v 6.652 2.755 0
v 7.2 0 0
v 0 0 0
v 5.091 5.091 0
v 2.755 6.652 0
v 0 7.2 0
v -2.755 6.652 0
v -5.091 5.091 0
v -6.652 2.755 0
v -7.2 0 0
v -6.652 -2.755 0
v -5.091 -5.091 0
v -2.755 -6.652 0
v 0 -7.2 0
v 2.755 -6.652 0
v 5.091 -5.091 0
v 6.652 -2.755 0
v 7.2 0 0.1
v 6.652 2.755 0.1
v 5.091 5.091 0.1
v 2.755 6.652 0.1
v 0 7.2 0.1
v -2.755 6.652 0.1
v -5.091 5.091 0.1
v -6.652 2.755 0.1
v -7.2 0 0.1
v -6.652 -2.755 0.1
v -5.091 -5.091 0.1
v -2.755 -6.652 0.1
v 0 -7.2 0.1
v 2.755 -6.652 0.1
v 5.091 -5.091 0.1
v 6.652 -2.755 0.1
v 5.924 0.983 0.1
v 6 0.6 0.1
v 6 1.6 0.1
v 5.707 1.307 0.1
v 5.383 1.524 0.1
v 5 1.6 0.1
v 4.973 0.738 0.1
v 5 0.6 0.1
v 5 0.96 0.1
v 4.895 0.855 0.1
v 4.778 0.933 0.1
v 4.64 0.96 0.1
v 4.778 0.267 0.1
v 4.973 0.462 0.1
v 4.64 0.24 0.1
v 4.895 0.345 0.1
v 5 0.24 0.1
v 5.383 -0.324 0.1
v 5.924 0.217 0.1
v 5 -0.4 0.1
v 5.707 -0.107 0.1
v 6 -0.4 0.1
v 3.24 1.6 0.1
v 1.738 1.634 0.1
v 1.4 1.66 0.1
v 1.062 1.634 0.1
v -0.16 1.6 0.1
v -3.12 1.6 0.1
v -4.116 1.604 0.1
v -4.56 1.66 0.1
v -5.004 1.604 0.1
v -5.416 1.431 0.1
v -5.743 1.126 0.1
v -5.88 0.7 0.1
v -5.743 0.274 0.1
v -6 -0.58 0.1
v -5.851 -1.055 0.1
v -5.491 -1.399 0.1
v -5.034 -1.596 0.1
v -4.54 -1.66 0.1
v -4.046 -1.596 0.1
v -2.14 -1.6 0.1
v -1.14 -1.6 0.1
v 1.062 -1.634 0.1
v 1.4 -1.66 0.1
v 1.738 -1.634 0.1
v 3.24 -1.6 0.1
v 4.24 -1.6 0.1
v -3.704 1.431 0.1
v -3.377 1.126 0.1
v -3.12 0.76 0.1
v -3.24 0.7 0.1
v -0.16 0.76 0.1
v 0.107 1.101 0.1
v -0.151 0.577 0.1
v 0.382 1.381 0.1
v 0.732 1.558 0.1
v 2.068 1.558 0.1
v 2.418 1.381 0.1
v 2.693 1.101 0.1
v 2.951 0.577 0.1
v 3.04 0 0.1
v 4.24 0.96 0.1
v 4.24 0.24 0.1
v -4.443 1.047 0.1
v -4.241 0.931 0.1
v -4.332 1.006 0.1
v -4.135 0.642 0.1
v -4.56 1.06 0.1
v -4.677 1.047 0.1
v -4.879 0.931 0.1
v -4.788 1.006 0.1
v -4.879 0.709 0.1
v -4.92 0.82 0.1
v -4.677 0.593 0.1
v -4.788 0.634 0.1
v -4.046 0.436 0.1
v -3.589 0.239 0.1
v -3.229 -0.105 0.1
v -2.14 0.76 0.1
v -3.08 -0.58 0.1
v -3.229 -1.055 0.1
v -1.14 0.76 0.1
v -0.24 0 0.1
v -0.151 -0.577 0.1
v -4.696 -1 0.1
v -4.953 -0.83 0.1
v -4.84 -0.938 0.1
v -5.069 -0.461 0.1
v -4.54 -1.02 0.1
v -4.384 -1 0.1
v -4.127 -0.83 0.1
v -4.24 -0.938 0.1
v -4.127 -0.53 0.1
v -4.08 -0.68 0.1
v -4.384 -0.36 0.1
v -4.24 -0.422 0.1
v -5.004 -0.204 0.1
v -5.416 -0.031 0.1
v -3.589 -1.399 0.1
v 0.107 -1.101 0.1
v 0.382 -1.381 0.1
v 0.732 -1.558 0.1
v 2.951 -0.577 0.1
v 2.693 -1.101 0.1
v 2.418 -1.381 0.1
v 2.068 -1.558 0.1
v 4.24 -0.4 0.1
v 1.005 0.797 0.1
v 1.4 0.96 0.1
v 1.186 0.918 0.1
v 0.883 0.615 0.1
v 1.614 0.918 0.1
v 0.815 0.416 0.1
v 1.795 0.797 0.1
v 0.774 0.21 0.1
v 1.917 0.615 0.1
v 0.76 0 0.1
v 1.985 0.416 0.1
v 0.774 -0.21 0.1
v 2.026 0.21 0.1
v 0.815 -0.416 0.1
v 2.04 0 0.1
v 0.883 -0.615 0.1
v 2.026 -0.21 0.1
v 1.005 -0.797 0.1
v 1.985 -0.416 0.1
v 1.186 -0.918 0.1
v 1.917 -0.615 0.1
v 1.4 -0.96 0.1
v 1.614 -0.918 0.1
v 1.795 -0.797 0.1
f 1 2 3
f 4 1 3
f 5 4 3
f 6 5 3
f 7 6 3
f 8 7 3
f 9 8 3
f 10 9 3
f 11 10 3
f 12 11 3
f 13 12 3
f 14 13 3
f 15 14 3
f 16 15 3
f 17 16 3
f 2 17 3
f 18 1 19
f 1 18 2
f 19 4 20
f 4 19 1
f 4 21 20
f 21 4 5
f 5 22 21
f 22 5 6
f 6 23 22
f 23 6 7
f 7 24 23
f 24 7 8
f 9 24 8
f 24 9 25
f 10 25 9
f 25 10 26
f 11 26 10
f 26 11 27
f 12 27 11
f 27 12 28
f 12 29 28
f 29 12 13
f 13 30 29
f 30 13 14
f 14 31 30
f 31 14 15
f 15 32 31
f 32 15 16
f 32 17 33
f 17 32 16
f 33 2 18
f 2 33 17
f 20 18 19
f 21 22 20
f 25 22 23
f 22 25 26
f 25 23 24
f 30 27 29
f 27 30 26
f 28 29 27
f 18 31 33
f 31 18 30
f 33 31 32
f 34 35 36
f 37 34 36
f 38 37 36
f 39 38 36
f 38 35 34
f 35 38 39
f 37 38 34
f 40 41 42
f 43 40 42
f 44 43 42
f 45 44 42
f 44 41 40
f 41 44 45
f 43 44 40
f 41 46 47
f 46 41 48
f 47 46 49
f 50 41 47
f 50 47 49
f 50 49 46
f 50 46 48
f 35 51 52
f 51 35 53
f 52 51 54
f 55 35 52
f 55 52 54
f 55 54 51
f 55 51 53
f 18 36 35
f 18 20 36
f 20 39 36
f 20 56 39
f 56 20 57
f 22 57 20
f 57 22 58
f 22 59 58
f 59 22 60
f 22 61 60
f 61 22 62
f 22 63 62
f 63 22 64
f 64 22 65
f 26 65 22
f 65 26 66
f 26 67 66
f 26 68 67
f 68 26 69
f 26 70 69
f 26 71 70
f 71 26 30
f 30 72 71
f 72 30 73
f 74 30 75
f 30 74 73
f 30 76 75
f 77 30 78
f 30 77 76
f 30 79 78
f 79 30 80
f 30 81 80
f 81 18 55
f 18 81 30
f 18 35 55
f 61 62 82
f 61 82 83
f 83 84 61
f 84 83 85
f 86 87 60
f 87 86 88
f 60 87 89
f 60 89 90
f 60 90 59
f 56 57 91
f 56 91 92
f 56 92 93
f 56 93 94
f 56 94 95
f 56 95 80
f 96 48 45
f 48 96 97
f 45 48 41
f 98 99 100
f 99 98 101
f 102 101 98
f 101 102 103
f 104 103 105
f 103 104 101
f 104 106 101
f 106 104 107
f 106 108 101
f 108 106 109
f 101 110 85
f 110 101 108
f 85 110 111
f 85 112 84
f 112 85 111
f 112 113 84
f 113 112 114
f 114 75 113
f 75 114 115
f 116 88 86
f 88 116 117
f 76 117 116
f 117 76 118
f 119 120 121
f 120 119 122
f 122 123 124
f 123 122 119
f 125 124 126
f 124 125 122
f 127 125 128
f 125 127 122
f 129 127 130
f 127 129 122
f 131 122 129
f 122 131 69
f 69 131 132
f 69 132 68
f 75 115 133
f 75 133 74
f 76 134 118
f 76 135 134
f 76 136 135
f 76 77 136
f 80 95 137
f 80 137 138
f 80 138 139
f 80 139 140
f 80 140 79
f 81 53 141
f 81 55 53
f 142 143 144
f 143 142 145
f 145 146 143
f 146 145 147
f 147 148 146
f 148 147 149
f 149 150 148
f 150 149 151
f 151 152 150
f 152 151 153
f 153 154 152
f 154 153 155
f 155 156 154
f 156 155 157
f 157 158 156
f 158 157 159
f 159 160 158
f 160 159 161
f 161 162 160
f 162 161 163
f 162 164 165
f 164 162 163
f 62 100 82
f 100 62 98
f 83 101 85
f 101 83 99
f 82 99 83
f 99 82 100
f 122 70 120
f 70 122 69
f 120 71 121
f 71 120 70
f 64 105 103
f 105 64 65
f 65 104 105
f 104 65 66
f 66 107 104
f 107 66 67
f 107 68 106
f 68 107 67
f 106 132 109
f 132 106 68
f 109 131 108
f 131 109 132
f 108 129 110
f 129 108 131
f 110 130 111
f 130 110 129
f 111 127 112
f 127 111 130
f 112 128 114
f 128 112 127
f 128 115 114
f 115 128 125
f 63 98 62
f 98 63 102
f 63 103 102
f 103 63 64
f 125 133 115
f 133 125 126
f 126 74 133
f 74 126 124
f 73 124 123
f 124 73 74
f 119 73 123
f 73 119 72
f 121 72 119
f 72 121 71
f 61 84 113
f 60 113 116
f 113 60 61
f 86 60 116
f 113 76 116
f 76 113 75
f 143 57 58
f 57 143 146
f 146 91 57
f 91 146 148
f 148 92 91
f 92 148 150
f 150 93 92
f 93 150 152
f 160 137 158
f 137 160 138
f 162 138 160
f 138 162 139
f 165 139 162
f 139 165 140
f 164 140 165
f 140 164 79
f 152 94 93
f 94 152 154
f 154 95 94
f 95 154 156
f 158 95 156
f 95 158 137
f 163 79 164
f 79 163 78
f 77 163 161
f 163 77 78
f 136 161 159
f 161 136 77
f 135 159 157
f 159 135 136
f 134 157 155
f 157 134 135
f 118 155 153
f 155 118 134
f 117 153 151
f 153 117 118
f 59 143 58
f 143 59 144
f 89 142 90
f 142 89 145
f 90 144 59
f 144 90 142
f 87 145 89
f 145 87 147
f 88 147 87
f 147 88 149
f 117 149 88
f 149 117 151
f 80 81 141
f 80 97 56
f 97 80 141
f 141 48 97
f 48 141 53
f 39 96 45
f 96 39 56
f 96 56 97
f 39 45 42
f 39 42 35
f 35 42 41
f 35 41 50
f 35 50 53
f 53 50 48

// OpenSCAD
// file: ../p/4-4disc.scad
use <../lib.scad>
function ldraw_lib__4_4disc() = [
// 0 Disc 1.0
// 0 Name: 4-4disc.dat
// 0 Author: James Jessiman
// 0 !LDRAW_ORG Primitive UPDATE 2002-02
// 0 !LICENSE Licensed under CC BY 4.0 : see CAreadme.txt
// 
// 0 BFC CERTIFY CCW
  [0,"BFC","CERTIFY"],
  [0,"BFC","CCW"],
// 
// 0 !HISTORY 1998-12-15 [PTadmin] Official Update 1998-10
// 0 !HISTORY 2002-03-23 [sbliss] Added BFC statement
// 0 !HISTORY 2002-04-25 [PTadmin] Official Update 2002-02
// 0 !HISTORY 2007-06-24 [PTadmin] Header formatted for Contributor Agreement
// 0 !HISTORY 2008-07-01 [PTadmin] Official Update 2008-01
// 
// 
// 3 16 0 0 0 1 0 0 0.9239 0 0.3827
  [3,16,0,0,0,1,0,0,0.9239,0,0.3827],
// 3 16 0 0 0 0.9239 0 0.3827 0.7071 0 0.7071
  [3,16,0,0,0,0.9239,0,0.3827,0.7071,0,0.7071],
// 3 16 0 0 0 0.7071 0 0.7071 0.3827 0 0.9239
  [3,16,0,0,0,0.7071,0,0.7071,0.3827,0,0.9239],
// 3 16 0 0 0 0.3827 0 0.9239 0 0 1
  [3,16,0,0,0,0.3827,0,0.9239,0,0,1],
// 3 16 0 0 0 0 0 1 -0.3827 0 0.9239
  [3,16,0,0,0,0,0,1,-0.3827,0,0.9239],
// 3 16 0 0 0 -0.3827 0 0.9239 -0.7071 0 0.7071
  [3,16,0,0,0,-0.3827,0,0.9239,-0.7071,0,0.7071],
// 3 16 0 0 0 -0.7071 0 0.7071 -0.9239 0 0.3827
  [3,16,0,0,0,-0.7071,0,0.7071,-0.9239,0,0.3827],
// 3 16 0 0 0 -0.9239 0 0.3827 -1 0 -0
  [3,16,0,0,0,-0.9239,0,0.3827,-1,0,-0],
// 3 16 0 0 0 -1 0 -0 -0.9239 0 -0.3827
  [3,16,0,0,0,-1,0,-0,-0.9239,0,-0.3827],
// 3 16 0 0 0 -0.9239 0 -0.3827 -0.7071 0 -0.7071
  [3,16,0,0,0,-0.9239,0,-0.3827,-0.7071,0,-0.7071],
// 3 16 0 0 0 -0.7071 0 -0.7071 -0.3827 0 -0.9239
  [3,16,0,0,0,-0.7071,0,-0.7071,-0.3827,0,-0.9239],
// 3 16 0 0 0 -0.3827 0 -0.9239 0 0 -1
  [3,16,0,0,0,-0.3827,0,-0.9239,0,0,-1],
// 3 16 0 0 0 0 0 -1 0.3827 0 -0.9239
  [3,16,0,0,0,0,0,-1,0.3827,0,-0.9239],
// 3 16 0 0 0 0.3827 0 -0.9239 0.7071 0 -0.7071
  [3,16,0,0,0,0.3827,0,-0.9239,0.7071,0,-0.7071],
// 3 16 0 0 0 0.7071 0 -0.7071 0.9239 0 -0.3827
  [3,16,0,0,0,0.7071,0,-0.7071,0.9239,0,-0.3827],
// 3 16 0 0 0 0.9239 0 -0.3827 1 0 0
  [3,16,0,0,0,0.9239,0,-0.3827,1,0,0],
// 0
];
module ldraw_lib__4_4disc(step=0, col=false, unit=2/5, alt=false, line=0.2, solid=!$preview)
    makepoly(ldraw_lib__4_4disc(), step=step, col=col, unit=unit, alt=alt, line=line, solid=solid);
ldraw_lib__4_4disc(line=0.2);
// file: ../p/4-4cyli.scad
use <../lib.scad>
function ldraw_lib__4_4cyli() = [
// 0 Cylinder 1.0
// 0 Name: 4-4cyli.dat
// 0 Author: James Jessiman
// 0 !LDRAW_ORG Primitive UPDATE 2005-01
// 0 !LICENSE Licensed under CC BY 4.0 : see CAreadme.txt
// 
// 0 BFC CERTIFY CCW
  [0,"BFC","CERTIFY"],
  [0,"BFC","CCW"],
// 
// 0 !HISTORY 1998-12-15 [PTadmin] Official Update 1998-10
// 0 !HISTORY 2002-03-23 [sbliss] Added BFC statement; merged headers from files in distributions LDraw 0.27 and Complete.
// 0 !HISTORY 2002-04-25 [PTadmin] Official Update 2002-02
// 0 !HISTORY 2004-12-14 [guyvivan] BFC CCW
// 0 !HISTORY 2005-12-28 [PTadmin] Official Update 2005-01
// 0 !HISTORY 2007-06-24 [PTadmin] Header formatted for Contributor Agreement
// 0 !HISTORY 2008-07-01 [PTadmin] Official Update 2008-01
// 
// 
// 4 16 1 1 0 0.9239 1 0.3827 0.9239 0 0.3827 1 0 0
  [4,16,1,1,0,0.9239,1,0.3827,0.9239,0,0.3827,1,0,0],
// 5 24 1 0 0 1 1 0 0.9239 0 0.3827 0.9239 0 -0.3827
  [5,24,1,0,0,1,1,0,0.9239,0,0.3827,0.9239,0,-0.3827],
// 4 16 0.9239 1 0.3827 0.7071 1 0.7071 0.7071 0 0.7071 0.9239 0 0.3827
  [4,16,0.9239,1,0.3827,0.7071,1,0.7071,0.7071,0,0.7071,0.9239,0,0.3827],
// 5 24 0.9239 0 0.3827 0.9239 1 0.3827 0.7071 0 0.7071 1 0 0
  [5,24,0.9239,0,0.3827,0.9239,1,0.3827,0.7071,0,0.7071,1,0,0],
// 4 16 0.7071 1 0.7071 0.3827 1 0.9239 0.3827 0 0.9239 0.7071 0 0.7071
  [4,16,0.7071,1,0.7071,0.3827,1,0.9239,0.3827,0,0.9239,0.7071,0,0.7071],
// 5 24 0.7071 0 0.7071 0.7071 1 0.7071 0.3827 0 0.9239 0.9239 0 0.3827
  [5,24,0.7071,0,0.7071,0.7071,1,0.7071,0.3827,0,0.9239,0.9239,0,0.3827],
// 4 16 0.3827 1 0.9239 0 1 1 0 0 1 0.3827 0 0.9239
  [4,16,0.3827,1,0.9239,0,1,1,0,0,1,0.3827,0,0.9239],
// 5 24 0.3827 0 0.9239 0.3827 1 0.9239 0 0 1 0.7071 0 0.7071
  [5,24,0.3827,0,0.9239,0.3827,1,0.9239,0,0,1,0.7071,0,0.7071],
// 4 16 0 1 1 -0.3827 1 0.9239 -0.3827 0 0.9239 0 0 1
  [4,16,0,1,1,-0.3827,1,0.9239,-0.3827,0,0.9239,0,0,1],
// 5 24 0 0 1 0 1 1 -0.3827 0 0.9239 0.3827 0 0.9239
  [5,24,0,0,1,0,1,1,-0.3827,0,0.9239,0.3827,0,0.9239],
// 4 16 -0.3827 1 0.9239 -0.7071 1 0.7071 -0.7071 0 0.7071 -0.3827 0 0.9239
  [4,16,-0.3827,1,0.9239,-0.7071,1,0.7071,-0.7071,0,0.7071,-0.3827,0,0.9239],
// 5 24 -0.3827 0 0.9239 -0.3827 1 0.9239 -0.7071 0 0.7071 0 0 1
  [5,24,-0.3827,0,0.9239,-0.3827,1,0.9239,-0.7071,0,0.7071,0,0,1],
// 4 16 -0.7071 1 0.7071 -0.9239 1 0.3827 -0.9239 0 0.3827 -0.7071 0 0.7071
  [4,16,-0.7071,1,0.7071,-0.9239,1,0.3827,-0.9239,0,0.3827,-0.7071,0,0.7071],
// 5 24 -0.7071 0 0.7071 -0.7071 1 0.7071 -0.9239 0 0.3827 -0.3827 0 0.9239
  [5,24,-0.7071,0,0.7071,-0.7071,1,0.7071,-0.9239,0,0.3827,-0.3827,0,0.9239],
// 4 16 -0.9239 1 0.3827 -1 1 0 -1 0 0 -0.9239 0 0.3827
  [4,16,-0.9239,1,0.3827,-1,1,0,-1,0,0,-0.9239,0,0.3827],
// 5 24 -0.9239 0 0.3827 -0.9239 1 0.3827 -1 0 0 -0.7071 0 0.7071
  [5,24,-0.9239,0,0.3827,-0.9239,1,0.3827,-1,0,0,-0.7071,0,0.7071],
// 4 16 -1 1 0 -0.9239 1 -0.3827 -0.9239 0 -0.3827 -1 0 0
  [4,16,-1,1,0,-0.9239,1,-0.3827,-0.9239,0,-0.3827,-1,0,0],
// 5 24 -1 0 0 -1 1 0 -0.9239 0 -0.3827 -0.9239 0 0.3827
  [5,24,-1,0,0,-1,1,0,-0.9239,0,-0.3827,-0.9239,0,0.3827],
// 4 16 -0.9239 1 -0.3827 -0.7071 1 -0.7071 -0.7071 0 -0.7071 -0.9239 0 -0.3827
  [4,16,-0.9239,1,-0.3827,-0.7071,1,-0.7071,-0.7071,0,-0.7071,-0.9239,0,-0.3827],
// 5 24 -0.9239 0 -0.3827 -0.9239 1 -0.3827 -0.7071 0 -0.7071 -1 0 0
  [5,24,-0.9239,0,-0.3827,-0.9239,1,-0.3827,-0.7071,0,-0.7071,-1,0,0],
// 4 16 -0.7071 1 -0.7071 -0.3827 1 -0.9239 -0.3827 0 -0.9239 -0.7071 0 -0.7071
  [4,16,-0.7071,1,-0.7071,-0.3827,1,-0.9239,-0.3827,0,-0.9239,-0.7071,0,-0.7071],
// 5 24 -0.7071 0 -0.7071 -0.7071 1 -0.7071 -0.3827 0 -0.9239 -0.9239 0 -0.3827
  [5,24,-0.7071,0,-0.7071,-0.7071,1,-0.7071,-0.3827,0,-0.9239,-0.9239,0,-0.3827],
// 4 16 -0.3827 1 -0.9239 0 1 -1 0 0 -1 -0.3827 0 -0.9239
  [4,16,-0.3827,1,-0.9239,0,1,-1,0,0,-1,-0.3827,0,-0.9239],
// 5 24 -0.3827 0 -0.9239 -0.3827 1 -0.9239 0 0 -1 -0.7071 0 -0.7071
  [5,24,-0.3827,0,-0.9239,-0.3827,1,-0.9239,0,0,-1,-0.7071,0,-0.7071],
// 4 16 0 1 -1 0.3827 1 -0.9239 0.3827 0 -0.9239 0 0 -1
  [4,16,0,1,-1,0.3827,1,-0.9239,0.3827,0,-0.9239,0,0,-1],
// 5 24 0 0 -1 0 1 -1 0.3827 0 -0.9239 -0.3827 0 -0.9239
  [5,24,0,0,-1,0,1,-1,0.3827,0,-0.9239,-0.3827,0,-0.9239],
// 4 16 0.3827 1 -0.9239 0.7071 1 -0.7071 0.7071 0 -0.7071 0.3827 0 -0.9239
  [4,16,0.3827,1,-0.9239,0.7071,1,-0.7071,0.7071,0,-0.7071,0.3827,0,-0.9239],
// 5 24 0.3827 0 -0.9239 0.3827 1 -0.9239 0.7071 0 -0.7071 0 0 -1
  [5,24,0.3827,0,-0.9239,0.3827,1,-0.9239,0.7071,0,-0.7071,0,0,-1],
// 4 16 0.7071 1 -0.7071 0.9239 1 -0.3827 0.9239 0 -0.3827 0.7071 0 -0.7071
  [4,16,0.7071,1,-0.7071,0.9239,1,-0.3827,0.9239,0,-0.3827,0.7071,0,-0.7071],
// 5 24 0.7071 0 -0.7071 0.7071 1 -0.7071 0.9239 0 -0.3827 0.3827 0 -0.9239
  [5,24,0.7071,0,-0.7071,0.7071,1,-0.7071,0.9239,0,-0.3827,0.3827,0,-0.9239],
// 4 16 0.9239 1 -0.3827 1 1 0 1 0 0 0.9239 0 -0.3827
  [4,16,0.9239,1,-0.3827,1,1,0,1,0,0,0.9239,0,-0.3827],
// 5 24 0.9239 0 -0.3827 0.9239 1 -0.3827 1 0 0 0.7071 0 -0.7071
  [5,24,0.9239,0,-0.3827,0.9239,1,-0.3827,1,0,0,0.7071,0,-0.7071],
// 0
];
module ldraw_lib__4_4cyli(step=0, col=false, unit=2/5, alt=false, line=0.2, solid=!$preview)
    makepoly(ldraw_lib__4_4cyli(), step=step, col=col, unit=unit, alt=alt, line=line, solid=solid);
ldraw_lib__4_4cyli(line=0.2);
// file: ../p/4-4cylc3.scad
use <../lib.scad>
use <4-4cyli.scad>
use <4-4disc.scad>
function ldraw_lib__4_4cylc3() = [
// 0 Cylinder Closed 1.0 without Top or Bottom Edge Lines
// 0 Name: 4-4cylc3.dat
// 0 Author: Chris Dee [cwdee]
// 0 !LDRAW_ORG Primitive UPDATE 2017-01
// 0 !LICENSE Licensed under CC BY 4.0 : see CAreadme.txt
// 
// 0 BFC CERTIFY CCW
  [0,"BFC","CERTIFY"],
  [0,"BFC","CCW"],
// 
// 0 !HISTORY 2017-12-30 [PTadmin] Official Update 2017-01
// 
// 
// 1 16 0 0 0 1 0 0 0 1 0 0 0 1 4-4disc.dat
  [1,16,0,0,0,1,0,0,0,1,0,0,0,1, ldraw_lib__4_4disc()],
// 1 16 0 0 0 1 0 0 0 1 0 0 0 1 4-4cyli.dat
  [1,16,0,0,0,1,0,0,0,1,0,0,0,1, ldraw_lib__4_4cyli()],
// 0
];
module ldraw_lib__4_4cylc3(step=0, col=false, unit=2/5, alt=false, line=0.2, solid=!$preview)
    makepoly(ldraw_lib__4_4cylc3(), step=step, col=col, unit=unit, alt=alt, line=line, solid=solid);
ldraw_lib__4_4cylc3(line=0.2);
// file: ../p/1-8chrd.scad
use <../lib.scad>
function ldraw_lib__1_8chrd() = [
// 0 Chord 0.125
// 0 Name: 1-8chrd.dat
// 0 Author: Orion Pobursky [OrionP]
// 0 !LDRAW_ORG Primitive UPDATE 2023-05
// 0 !LICENSE Licensed under CC BY 4.0 : see CAreadme.txt
// 
// 0 BFC CERTIFY CCW
  [0,"BFC","CERTIFY"],
  [0,"BFC","CCW"],
// 
// 0 !HISTORY 2004-04-22 [PTadmin] Official Update 2004-02
// 0 !HISTORY 2007-06-22 [PTadmin] Header formatted for Contributor Agreement
// 0 !HISTORY 2008-07-01 [PTadmin] Official Update 2008-01
// 0 !HISTORY 2023-10-27 [OrionP] Rebuilt with PrimGen2, original author westrate
// 0 !HISTORY 2023-10-31 [OrionP] Official Update 2023-05
// 
// 3 16 1 0 0 0.9239 0 0.3827 0.7071 0 0.7071
  [3,16,1,0,0,0.9239,0,0.3827,0.7071,0,0.7071],
];
module ldraw_lib__1_8chrd(step=0, col=false, unit=2/5, alt=false, line=0.2, solid=!$preview)
    makepoly(ldraw_lib__1_8chrd(), step=step, col=col, unit=unit, alt=alt, line=line, solid=solid);
ldraw_lib__1_8chrd(line=0.2);
// file: ../p/1-4ndis.scad
use <../lib.scad>
function ldraw_lib__1_4ndis() = [
// 0 Disc Negative 0.25
// 0 Name: 1-4ndis.dat
// 0 Author: James Jessiman
// 0 !LDRAW_ORG Primitive UPDATE 2012-01
// 0 !LICENSE Licensed under CC BY 4.0 : see CAreadme.txt
// 
// 0 BFC CERTIFY CCW
  [0,"BFC","CERTIFY"],
  [0,"BFC","CCW"],
// 
// 0 !HISTORY 2002-03-23 [sbliss] Added BFC Statement
// 0 !HISTORY 2002-04-25 [PTadmin] Official Update 2002-02
// 0 !HISTORY 2007-06-22 [PTadmin] Header formatted for Contributor Agreement
// 0 !HISTORY 2008-07-01 [PTadmin] Official Update 2008-01
// 0 !HISTORY 2012-02-16 [Philo] Changed to CCW
// 0 !HISTORY 2012-03-30 [PTadmin] Official Update 2012-01
// 
// 
// 3 16 0.9239 0 0.3827 1 0 0 1 0 1
  [3,16,0.9239,0,0.3827,1,0,0,1,0,1],
// 3 16 0.7071 0 0.7071 0.9239 0 0.3827 1 0 1
  [3,16,0.7071,0,0.7071,0.9239,0,0.3827,1,0,1],
// 3 16 0.3827 0 0.9239 0.7071 0 0.7071 1 0 1
  [3,16,0.3827,0,0.9239,0.7071,0,0.7071,1,0,1],
// 3 16 0 0 1 0.3827 0 0.9239 1 0 1
  [3,16,0,0,1,0.3827,0,0.9239,1,0,1],
];
module ldraw_lib__1_4ndis(step=0, col=false, unit=2/5, alt=false, line=0.2, solid=!$preview)
    makepoly(ldraw_lib__1_4ndis(), step=step, col=col, unit=unit, alt=alt, line=line, solid=solid);
ldraw_lib__1_4ndis(line=0.2);
// file: ../p/1-4chrd.scad
use <../lib.scad>
function ldraw_lib__1_4chrd() = [
// 0 Chord 0.25
// 0 Name: 1-4chrd.dat
// 0 Author: Max Martin Richter [MMR1988]
// 0 !LDRAW_ORG Primitive UPDATE 2023-05
// 0 !LICENSE Licensed under CC BY 4.0 : see CAreadme.txt
// 
// 0 BFC CERTIFY CCW
  [0,"BFC","CERTIFY"],
  [0,"BFC","CCW"],
// 
// 0 !HISTORY 2004-04-22 [PTadmin] Official Update 2004-02
// 0 !HISTORY 2007-10-09 [PTadmin] Header formatted for Contributor Agreement
// 0 !HISTORY 2008-07-01 [PTadmin] Official Update 2008-01
// 0 !HISTORY 2012-08-02 [MMR1988] Re-creation with PrimGen2 and Rectifier
// 0 !HISTORY 2012-08-09 [PTadmin] Official Update 2012-02
// 0 !HISTORY 2023-10-27 [OrionP] Change author to MMR1988 from hafhead
// 0 !HISTORY 2023-10-31 [OrionP] Official Update 2023-05
// 
// 4 16 0.9239 0 0.3827 0.3827 0 0.9239 0 0 1 1 0 0
  [4,16,0.9239,0,0.3827,0.3827,0,0.9239,0,0,1,1,0,0],
// 3 16 0.7071 0 0.7071 0.3827 0 0.9239 0.9239 0 0.3827
  [3,16,0.7071,0,0.7071,0.3827,0,0.9239,0.9239,0,0.3827],
];
module ldraw_lib__1_4chrd(step=0, col=false, unit=2/5, alt=false, line=0.2, solid=!$preview)
    makepoly(ldraw_lib__1_4chrd(), step=step, col=col, unit=unit, alt=alt, line=line, solid=solid);
ldraw_lib__1_4chrd(line=0.2);
// main file
use <../lib.scad>
use <../p/1-4chrd.scad>
use <../p/1-4ndis.scad>
use <../p/1-8chrd.scad>
use <../p/4-4cylc3.scad>
function ldraw_lib__6177973l() = [
// 0 Sticker  1.8 x  1.8 with White "STOP" on Red Background
// 0 Name: 6177973l.dat
// 0 Author: Massimo Maso [Sirio]
// 0 !LDRAW_ORG Part UPDATE 2026-09
// 0 !LICENSE Licensed under CC BY 4.0 : see CAreadme.txt
// 
// 0 BFC CERTIFY CCW
  [0,"BFC","CERTIFY"],
  [0,"BFC","CCW"],
// 
// 0 !CATEGORY Sticker
// 0 !KEYWORDS 2016, 44, 6, AMG, BrickLink 75883stk01, Brickowl 129746, F1, Formula
// 0 !KEYWORDS Hamilton, Hybrid, Lewis, Mercedes, Nico, One, Petronas
// 0 !KEYWORDS Rebrickable 30901, Rosberg, Set 75883, Speed Champions, Team, Toto
// 0 !KEYWORDS W07, Wolff
// 
// 0 !HISTORY 2026-09-30 [OrionP] Official Update 2026-09
// 
// 0 // Primitives
// 1 16 0 0 0 18 0 0 0 -.25 0 0 0 18 4-4cylc3.dat
  [1,16,0,0,0,18,0,0,0,-.25,0,0,0,18, ldraw_lib__4_4cylc3()],
// 1 4 0 -.25 0 18 0 0 0 1 0 0 0 18 1-8chrd.dat
  [1,4,0,-.25,0,18,0,0,0,1,0,0,0,18, ldraw_lib__1_8chrd()],
// 1 4 0 -.25 0 0 0 18 0 1 0 18 0 0 1-8chrd.dat
  [1,4,0,-.25,0,0,0,18,0,1,0,18,0,0, ldraw_lib__1_8chrd()],
// 1 4 0 -.25 0 -18 0 0 0 1 0 0 0 18 1-4chrd.dat
  [1,4,0,-.25,0,-18,0,0,0,1,0,0,0,18, ldraw_lib__1_4chrd()],
// 1 4 0 -.25 0 -18 0 0 0 1 0 0 0 -18 1-4chrd.dat
  [1,4,0,-.25,0,-18,0,0,0,1,0,0,0,-18, ldraw_lib__1_4chrd()],
// 1 4 0 -.25 0 18 0 0 0 1 0 0 0 -18 1-4chrd.dat
  [1,4,0,-.25,0,18,0,0,0,1,0,0,0,-18, ldraw_lib__1_4chrd()],
// 1 4 12.5 -.25 1.5 2.5 0 0 0 1 0 0 0 2.5 1-4ndis.dat
  [1,4,12.5,-.25,1.5,2.5,0,0,0,1,0,0,0,2.5, ldraw_lib__1_4ndis()],
// 1 15 12.5 -.25 1.5 2.5 0 0 0 1 0 0 0 2.5 1-4chrd.dat
  [1,15,12.5,-.25,1.5,2.5,0,0,0,1,0,0,0,2.5, ldraw_lib__1_4chrd()],
// 1 15 11.6 -.25 1.5 .9 0 0 0 1 0 0 0 .9 1-4ndis.dat
  [1,15,11.6,-.25,1.5,.9,0,0,0,1,0,0,0,.9, ldraw_lib__1_4ndis()],
// 1 4 11.6 -.25 1.5 .9 0 0 0 1 0 0 0 .9 1-4chrd.dat
  [1,4,11.6,-.25,1.5,.9,0,0,0,1,0,0,0,.9, ldraw_lib__1_4chrd()],
// 1 4 11.6 -.25 1.5 .9 0 0 0 1 0 0 0 -.9 1-4chrd.dat
  [1,4,11.6,-.25,1.5,.9,0,0,0,1,0,0,0,-.9, ldraw_lib__1_4chrd()],
// 1 15 11.6 -.25 1.5 .9 0 0 0 1 0 0 0 -.9 1-4ndis.dat
  [1,15,11.6,-.25,1.5,.9,0,0,0,1,0,0,0,-.9, ldraw_lib__1_4ndis()],
// 1 15 12.5 -.25 1.5 2.5 0 0 0 1 0 0 0 -2.5 1-4chrd.dat
  [1,15,12.5,-.25,1.5,2.5,0,0,0,1,0,0,0,-2.5, ldraw_lib__1_4chrd()],
// 1 4 12.5 -.25 1.5 2.5 0 0 0 1 0 0 0 -2.5 1-4ndis.dat
  [1,4,12.5,-.25,1.5,2.5,0,0,0,1,0,0,0,-2.5, ldraw_lib__1_4ndis()],
// 0 // Top face
// 0 // Red faces
// 3 4 18 -.25 0 15 -.25 4 15 -.25 1.5
  [3,4,18,-.25,0,15,-.25,4,15,-.25,1.5],
// 3 4 18 -.25 0 12.7278 -.25 12.7278 15 -.25 4
  [3,4,18,-.25,0,12.7278,-.25,12.7278,15,-.25,4],
// 3 4 12.7278 -.25 12.7278 12.5 -.25 4 15 -.25 4
  [3,4,12.7278,-.25,12.7278,12.5,-.25,4,15,-.25,4],
// 4 4 12.7278 -.25 12.7278 4.3441 -.25 4.086 8.1 -.25 4 12.5 -.25 4
  [4,4,12.7278,-.25,12.7278,4.3441,-.25,4.086,8.1,-.25,4,12.5,-.25,4],
// 4 4 12.7278 -.25 12.7278 0 -.25 18 3.5 -.25 4.15 4.3441 -.25 4.086
  [4,4,12.7278,-.25,12.7278,0,-.25,18,3.5,-.25,4.15,4.3441,-.25,4.086],
// 4 4 0 -.25 18 -.4 -.25 4 2.6559 -.25 4.086 3.5 -.25 4.15
  [4,4,0,-.25,18,-.4,-.25,4,2.6559,-.25,4.086,3.5,-.25,4.15],
// 4 4 0 -.25 18 -10.2907 -.25 4.0103 -7.8 -.25 4 -.4 -.25 4
  [4,4,0,-.25,18,-10.2907,-.25,4.0103,-7.8,-.25,4,-.4,-.25,4],
// 3 4 0 -.25 18 -11.4 -.25 4.15 -10.2907 -.25 4.0103
  [3,4,0,-.25,18,-11.4,-.25,4.15,-10.2907,-.25,4.0103],
// 3 4 -11.4 -.25 4.15 0 -.25 18 -12.5093 -.25 4.0103
  [3,4,-11.4,-.25,4.15,0,-.25,18,-12.5093,-.25,4.0103],
// 3 4 -12.5093 -.25 4.0103 0 -.25 18 -13.54 -.25 3.5769
  [3,4,-12.5093,-.25,4.0103,0,-.25,18,-13.54,-.25,3.5769],
// 4 4 0 -.25 18 -18 -.25 0 -14.3577 -.25 2.8144 -13.54 -.25 3.5769
  [4,4,0,-.25,18,-18,-.25,0,-14.3577,-.25,2.8144,-13.54,-.25,3.5769],
// 3 4 -18 -.25 0 -14.7 -.25 1.75 -14.3577 -.25 2.8144
  [3,4,-18,-.25,0,-14.7,-.25,1.75,-14.3577,-.25,2.8144],
// 4 4 -18 -.25 0 -15 -.25 -1.45 -14.3577 -.25 .6856 -14.7 -.25 1.75
  [4,4,-18,-.25,0,-15,-.25,-1.45,-14.3577,-.25,.6856,-14.7,-.25,1.75],
// 3 4 -18 -.25 0 -14.6277 -.25 -2.6379 -15 -.25 -1.45
  [3,4,-18,-.25,0,-14.6277,-.25,-2.6379,-15,-.25,-1.45],
// 4 4 -18 -.25 0 0 -.25 -18 -13.728 -.25 -3.4983 -14.6277 -.25 -2.6379
  [4,4,-18,-.25,0,0,-.25,-18,-13.728,-.25,-3.4983,-14.6277,-.25,-2.6379],
// 3 4 0 -.25 -18 -12.5847 -.25 -3.9908 -13.728 -.25 -3.4983
  [3,4,0,-.25,-18,-12.5847,-.25,-3.9908,-13.728,-.25,-3.4983],
// 3 4 -12.5847 -.25 -3.9908 0 -.25 -18 -11.35 -.25 -4.15
  [3,4,-12.5847,-.25,-3.9908,0,-.25,-18,-11.35,-.25,-4.15],
// 4 4 0 -.25 -18 -5.35 -.25 -4 -10.1153 -.25 -3.9908 -11.35 -.25 -4.15
  [4,4,0,-.25,-18,-5.35,-.25,-4,-10.1153,-.25,-3.9908,-11.35,-.25,-4.15],
// 3 4 0 -.25 -18 -2.85 -.25 -4 -5.35 -.25 -4
  [3,4,0,-.25,-18,-2.85,-.25,-4,-5.35,-.25,-4],
// 4 4 0 -.25 -18 3.5 -.25 -4.15 2.6559 -.25 -4.086 -2.85 -.25 -4
  [4,4,0,-.25,-18,3.5,-.25,-4.15,2.6559,-.25,-4.086,-2.85,-.25,-4],
// 4 4 0 -.25 -18 8.1 -.25 -4 4.3441 -.25 -4.086 3.5 -.25 -4.15
  [4,4,0,-.25,-18,8.1,-.25,-4,4.3441,-.25,-4.086,3.5,-.25,-4.15],
// 3 4 0 -.25 -18 10.6 -.25 -4 8.1 -.25 -4
  [3,4,0,-.25,-18,10.6,-.25,-4,8.1,-.25,-4],
// 4 4 0 -.25 -18 18 -.25 0 15 -.25 -1 10.6 -.25 -4
  [4,4,0,-.25,-18,18,-.25,0,15,-.25,-1,10.6,-.25,-4],
// 3 4 18 -.25 0 15 -.25 1.5 15 -.25 -1
  [3,4,18,-.25,0,15,-.25,1.5,15,-.25,-1],
// 3 4 -7.8 -.25 4 -10.2907 -.25 4.0103 -9.26 -.25 3.5769
  [3,4,-7.8,-.25,4,-10.2907,-.25,4.0103,-9.26,-.25,3.5769],
// 3 4 -7.8 -.25 4 -9.26 -.25 3.5769 -8.4423 -.25 2.8144
  [3,4,-7.8,-.25,4,-9.26,-.25,3.5769,-8.4423,-.25,2.8144],
// 4 4 -7.8 -.25 4 -8.4423 -.25 2.8144 -8.1 -.25 1.75 -7.8 -.25 1.9
  [4,4,-7.8,-.25,4,-8.4423,-.25,2.8144,-8.1,-.25,1.75,-7.8,-.25,1.9],
// 4 4 -.4 -.25 4 -.4 -.25 1.9 -.3781 -.25 1.4425 .267 -.25 2.7516
  [4,4,-.4,-.25,4,-.4,-.25,1.9,-.3781,-.25,1.4425,.267,-.25,2.7516],
// 3 4 -.4 -.25 4 .267 -.25 2.7516 .9541 -.25 3.4533
  [3,4,-.4,-.25,4,.267,-.25,2.7516,.9541,-.25,3.4533],
// 3 4 -.4 -.25 4 .9541 -.25 3.4533 1.831 -.25 3.8955
  [3,4,-.4,-.25,4,.9541,-.25,3.4533,1.831,-.25,3.8955],
// 3 4 -.4 -.25 4 1.831 -.25 3.8955 2.6559 -.25 4.086
  [3,4,-.4,-.25,4,1.831,-.25,3.8955,2.6559,-.25,4.086],
// 3 4 8.1 -.25 4 4.3441 -.25 4.086 5.169 -.25 3.8955
  [3,4,8.1,-.25,4,4.3441,-.25,4.086,5.169,-.25,3.8955],
// 3 4 8.1 -.25 4 5.169 -.25 3.8955 6.0459 -.25 3.4533
  [3,4,8.1,-.25,4,5.169,-.25,3.8955,6.0459,-.25,3.4533],
// 3 4 8.1 -.25 4 6.0459 -.25 3.4533 6.733 -.25 2.7516
  [3,4,8.1,-.25,4,6.0459,-.25,3.4533,6.733,-.25,2.7516],
// 3 4 8.1 -.25 4 6.733 -.25 2.7516 7.3781 -.25 1.4425
  [3,4,8.1,-.25,4,6.733,-.25,2.7516,7.3781,-.25,1.4425],
// 3 4 8.1 -.25 4 7.3781 -.25 1.4425 7.6 -.25 0
  [3,4,8.1,-.25,4,7.3781,-.25,1.4425,7.6,-.25,0],
// 3 4 8.1 -.25 4 7.6 -.25 0 8.1 -.25 -4
  [3,4,8.1,-.25,4,7.6,-.25,0,8.1,-.25,-4],
// 4 4 11.6 -.25 2.4 10.6 -.25 2.4 10.6 -.25 .6 11.6 -.25 .6
  [4,4,11.6,-.25,2.4,10.6,-.25,2.4,10.6,-.25,.6,11.6,-.25,.6],
// 3 4 11.6 -.25 2.4 11.6 -.25 .6 12.5 -.25 1.5
  [3,4,11.6,-.25,2.4,11.6,-.25,.6,12.5,-.25,1.5],
// 4 4 -10.3363 -.25 1.6042 -10.6017 -.25 2.3271 -10.83 -.25 2.5143 -11.1066 -.25 2.6172
  [4,4,-10.3363,-.25,1.6042,-10.6017,-.25,2.3271,-10.83,-.25,2.5143,-11.1066,-.25,2.6172],
// 4 4 -10.3363 -.25 1.6042 -11.1066 -.25 2.6172 -11.4 -.25 2.65 -11.6934 -.25 2.6172
  [4,4,-10.3363,-.25,1.6042,-11.1066,-.25,2.6172,-11.4,-.25,2.65,-11.6934,-.25,2.6172],
// 4 4 -10.3363 -.25 1.6042 -11.6934 -.25 2.6172 -11.97 -.25 2.5143 -12.1983 -.25 2.3271
  [4,4,-10.3363,-.25,1.6042,-11.6934,-.25,2.6172,-11.97,-.25,2.5143,-12.1983,-.25,2.3271],
// 4 4 -10.3363 -.25 1.6042 -12.1983 -.25 2.3271 -12.3 -.25 2.05 -12.1983 -.25 1.7729
  [4,4,-10.3363,-.25,1.6042,-12.1983,-.25,2.3271,-12.3,-.25,2.05,-12.1983,-.25,1.7729],
// 4 4 -10.3363 -.25 1.6042 -12.1983 -.25 1.7729 -11.97 -.25 1.5857 -11.6934 -.25 1.4828
  [4,4,-10.3363,-.25,1.6042,-12.1983,-.25,1.7729,-11.97,-.25,1.5857,-11.6934,-.25,1.4828],
// 4 4 -10.3363 -.25 1.6042 -11.6934 -.25 1.4828 -10.1153 -.25 1.0908 -8.1 -.25 1.75
  [4,4,-10.3363,-.25,1.6042,-11.6934,-.25,1.4828,-10.1153,-.25,1.0908,-8.1,-.25,1.75],
// 3 4 -8.1 -.25 1.75 -10.1153 -.25 1.0908 -8.972 -.25 .5983
  [3,4,-8.1,-.25,1.75,-10.1153,-.25,1.0908,-8.972,-.25,.5983],
// 4 4 -8.1 -.25 1.75 -8.972 -.25 .5983 -8.0723 -.25 -.2621 -7.8 -.25 1.9
  [4,4,-8.1,-.25,1.75,-8.972,-.25,.5983,-8.0723,-.25,-.2621,-7.8,-.25,1.9],
// 4 4 -5.35 -.25 1.9 -7.8 -.25 1.9 -8.0723 -.25 -.2621 -7.7 -.25 -1.45
  [4,4,-5.35,-.25,1.9,-7.8,-.25,1.9,-8.0723,-.25,-.2621,-7.7,-.25,-1.45],
// 4 4 -5.35 -.25 1.9 -7.7 -.25 -1.45 -8.0723 -.25 -2.6379 -5.35 -.25 -4
  [4,4,-5.35,-.25,1.9,-7.7,-.25,-1.45,-8.0723,-.25,-2.6379,-5.35,-.25,-4],
// 4 4 -2.85 -.25 1.9 -.6 -.25 0 -.3781 -.25 1.4425 -.4 -.25 1.9
  [4,4,-2.85,-.25,1.9,-.6,-.25,0,-.3781,-.25,1.4425,-.4,-.25,1.9],
// 4 4 -2.85 -.25 1.9 -2.85 -.25 -4 -.3781 -.25 -1.4425 -.6 -.25 0
  [4,4,-2.85,-.25,1.9,-2.85,-.25,-4,-.3781,-.25,-1.4425,-.6,-.25,0],
// 4 4 -12.6717 -.25 -1.1528 -12.3826 -.25 -2.0741 -12.0991 -.25 -2.3449 -11.7389 -.25 -2.4999
  [4,4,-12.6717,-.25,-1.1528,-12.3826,-.25,-2.0741,-12.0991,-.25,-2.3449,-11.7389,-.25,-2.4999],
// 4 4 -12.6717 -.25 -1.1528 -11.7389 -.25 -2.4999 -11.35 -.25 -2.55 -10.9611 -.25 -2.4999
  [4,4,-12.6717,-.25,-1.1528,-11.7389,-.25,-2.4999,-11.35,-.25,-2.55,-10.9611,-.25,-2.4999],
// 4 4 -12.6717 -.25 -1.1528 -10.9611 -.25 -2.4999 -10.6009 -.25 -2.3449 -10.3174 -.25 -2.0741
  [4,4,-12.6717,-.25,-1.1528,-10.9611,-.25,-2.4999,-10.6009,-.25,-2.3449,-10.3174,-.25,-2.0741],
// 4 4 -12.6717 -.25 -1.1528 -10.3174 -.25 -2.0741 -10.2 -.25 -1.7 -10.3174 -.25 -1.3259
  [4,4,-12.6717,-.25,-1.1528,-10.3174,-.25,-2.0741,-10.2,-.25,-1.7,-10.3174,-.25,-1.3259],
// 4 4 -12.6717 -.25 -1.1528 -10.3174 -.25 -1.3259 -10.6009 -.25 -1.0551 -10.9611 -.25 -.9001
  [4,4,-12.6717,-.25,-1.1528,-10.3174,-.25,-1.3259,-10.6009,-.25,-1.0551,-10.9611,-.25,-.9001],
// 4 4 -12.6717 -.25 -1.1528 -10.9611 -.25 -.9001 -12.5093 -.25 -.5103 -15 -.25 -1.45
  [4,4,-12.6717,-.25,-1.1528,-10.9611,-.25,-.9001,-12.5093,-.25,-.5103,-15,-.25,-1.45],
// 3 4 -15 -.25 -1.45 -12.5093 -.25 -.5103 -13.54 -.25 -.0769
  [3,4,-15,-.25,-1.45,-12.5093,-.25,-.5103,-13.54,-.25,-.0769],
// 3 4 -15 -.25 -1.45 -13.54 -.25 -.0769 -14.3577 -.25 .6856
  [3,4,-15,-.25,-1.45,-13.54,-.25,-.0769,-14.3577,-.25,.6856],
// 3 4 -5.35 -.25 -4 -8.0723 -.25 -2.6379 -8.972 -.25 -3.4983
  [3,4,-5.35,-.25,-4,-8.0723,-.25,-2.6379,-8.972,-.25,-3.4983],
// 3 4 -5.35 -.25 -4 -8.972 -.25 -3.4983 -10.1153 -.25 -3.9908
  [3,4,-5.35,-.25,-4,-8.972,-.25,-3.4983,-10.1153,-.25,-3.9908],
// 3 4 -2.85 -.25 -4 .267 -.25 -2.7516 -.3781 -.25 -1.4425
  [3,4,-2.85,-.25,-4,.267,-.25,-2.7516,-.3781,-.25,-1.4425],
// 3 4 -2.85 -.25 -4 .9541 -.25 -3.4533 .267 -.25 -2.7516
  [3,4,-2.85,-.25,-4,.9541,-.25,-3.4533,.267,-.25,-2.7516],
// 3 4 -2.85 -.25 -4 1.831 -.25 -3.8955 .9541 -.25 -3.4533
  [3,4,-2.85,-.25,-4,1.831,-.25,-3.8955,.9541,-.25,-3.4533],
// 3 4 -2.85 -.25 -4 2.6559 -.25 -4.086 1.831 -.25 -3.8955
  [3,4,-2.85,-.25,-4,2.6559,-.25,-4.086,1.831,-.25,-3.8955],
// 3 4 8.1 -.25 -4 7.6 -.25 0 7.3781 -.25 -1.4425
  [3,4,8.1,-.25,-4,7.6,-.25,0,7.3781,-.25,-1.4425],
// 3 4 8.1 -.25 -4 7.3781 -.25 -1.4425 6.733 -.25 -2.7516
  [3,4,8.1,-.25,-4,7.3781,-.25,-1.4425,6.733,-.25,-2.7516],
// 3 4 8.1 -.25 -4 6.733 -.25 -2.7516 6.0459 -.25 -3.4533
  [3,4,8.1,-.25,-4,6.733,-.25,-2.7516,6.0459,-.25,-3.4533],
// 3 4 8.1 -.25 -4 6.0459 -.25 -3.4533 5.169 -.25 -3.8955
  [3,4,8.1,-.25,-4,6.0459,-.25,-3.4533,5.169,-.25,-3.8955],
// 3 4 8.1 -.25 -4 5.169 -.25 -3.8955 4.3441 -.25 -4.086
  [3,4,8.1,-.25,-4,5.169,-.25,-3.8955,4.3441,-.25,-4.086],
// 3 4 10.6 -.25 -4 12.5 -.25 -1 10.6 -.25 -1
  [3,4,10.6,-.25,-4,12.5,-.25,-1,10.6,-.25,-1],
// 3 4 10.6 -.25 -4 15 -.25 -1 12.5 -.25 -1
  [3,4,10.6,-.25,-4,15,-.25,-1,12.5,-.25,-1],
// 4 4 3.5 -.25 2.4 2.9651 -.25 2.2938 2.5114 -.25 1.9913 2.2077 -.25 1.5385
  [4,4,3.5,-.25,2.4,2.9651,-.25,2.2938,2.5114,-.25,1.9913,2.2077,-.25,1.5385],
// 4 4 3.5 -.25 2.4 2.2077 -.25 1.5385 2.0377 -.25 1.0407 4.0349 -.25 2.2938
  [4,4,3.5,-.25,2.4,2.2077,-.25,1.5385,2.0377,-.25,1.0407,4.0349,-.25,2.2938],
// 4 4 4.0349 -.25 2.2938 2.0377 -.25 1.0407 1.9346 -.25 .5249 4.4886 -.25 1.9913
  [4,4,4.0349,-.25,2.2938,2.0377,-.25,1.0407,1.9346,-.25,.5249,4.4886,-.25,1.9913],
// 4 4 4.4886 -.25 1.9913 1.9346 -.25 .5249 1.9 -.25 0 4.7923 -.25 1.5385
  [4,4,4.4886,-.25,1.9913,1.9346,-.25,.5249,1.9,-.25,0,4.7923,-.25,1.5385],
// 4 4 4.7923 -.25 1.5385 1.9 -.25 0 1.9346 -.25 -.5249 4.9623 -.25 1.0407
  [4,4,4.7923,-.25,1.5385,1.9,-.25,0,1.9346,-.25,-.5249,4.9623,-.25,1.0407],
// 4 4 4.9623 -.25 1.0407 1.9346 -.25 -.5249 2.0377 -.25 -1.0407 5.0654 -.25 .5249
  [4,4,4.9623,-.25,1.0407,1.9346,-.25,-.5249,2.0377,-.25,-1.0407,5.0654,-.25,.5249],
// 4 4 5.0654 -.25 .5249 2.0377 -.25 -1.0407 2.2077 -.25 -1.5385 5.1 -.25 0
  [4,4,5.0654,-.25,.5249,2.0377,-.25,-1.0407,2.2077,-.25,-1.5385,5.1,-.25,0],
// 4 4 5.1 -.25 0 2.2077 -.25 -1.5385 2.5114 -.25 -1.9913 5.0654 -.25 -.5249
  [4,4,5.1,-.25,0,2.2077,-.25,-1.5385,2.5114,-.25,-1.9913,5.0654,-.25,-.5249],
// 4 4 5.0654 -.25 -.5249 2.5114 -.25 -1.9913 2.9651 -.25 -2.2938 4.9623 -.25 -1.0407
  [4,4,5.0654,-.25,-.5249,2.5114,-.25,-1.9913,2.9651,-.25,-2.2938,4.9623,-.25,-1.0407],
// 4 4 4.9623 -.25 -1.0407 2.9651 -.25 -2.2938 3.5 -.25 -2.4 4.7923 -.25 -1.5385
  [4,4,4.9623,-.25,-1.0407,2.9651,-.25,-2.2938,3.5,-.25,-2.4,4.7923,-.25,-1.5385],
// 4 4 4.7923 -.25 -1.5385 3.5 -.25 -2.4 4.0349 -.25 -2.2938 4.4886 -.25 -1.9913
  [4,4,4.7923,-.25,-1.5385,3.5,-.25,-2.4,4.0349,-.25,-2.2938,4.4886,-.25,-1.9913],
// 0 // White text "STOP"
// 0 // Letter "S"
// 4 15 -10.2907 -.25 4.0103 -11.1066 -.25 2.6172 -10.83 -.25 2.5143 -9.26 -.25 3.5769
  [4,15,-10.2907,-.25,4.0103,-11.1066,-.25,2.6172,-10.83,-.25,2.5143,-9.26,-.25,3.5769],
// 4 15 -8.4423 -.25 2.8144 -10.6017 -.25 2.3271 -10.3363 -.25 1.6042 -8.1 -.25 1.75
  [4,15,-8.4423,-.25,2.8144,-10.6017,-.25,2.3271,-10.3363,-.25,1.6042,-8.1,-.25,1.75],
// 4 15 -9.26 -.25 3.5769 -10.83 -.25 2.5143 -10.6017 -.25 2.3271 -8.4423 -.25 2.8144
  [4,15,-9.26,-.25,3.5769,-10.83,-.25,2.5143,-10.6017,-.25,2.3271,-8.4423,-.25,2.8144],
// 4 15 -12.6717 -.25 -1.1528 -15 -.25 -1.45 -14.6277 -.25 -2.6379 -12.3826 -.25 -2.0741
  [4,15,-12.6717,-.25,-1.1528,-15,-.25,-1.45,-14.6277,-.25,-2.6379,-12.3826,-.25,-2.0741],
// 4 15 -13.728 -.25 -3.4983 -12.0991 -.25 -2.3449 -12.3826 -.25 -2.0741 -14.6277 -.25 -2.6379
  [4,15,-13.728,-.25,-3.4983,-12.0991,-.25,-2.3449,-12.3826,-.25,-2.0741,-14.6277,-.25,-2.6379],
// 4 15 -11.6934 -.25 2.6172 -12.5093 -.25 4.0103 -13.54 -.25 3.5769 -11.97 -.25 2.5143
  [4,15,-11.6934,-.25,2.6172,-12.5093,-.25,4.0103,-13.54,-.25,3.5769,-11.97,-.25,2.5143],
// 4 15 -14.3577 -.25 2.8144 -12.1983 -.25 2.3271 -11.97 -.25 2.5143 -13.54 -.25 3.5769
  [4,15,-14.3577,-.25,2.8144,-12.1983,-.25,2.3271,-11.97,-.25,2.5143,-13.54,-.25,3.5769],
// 4 15 -14.7 -.25 1.75 -12.3 -.25 2.05 -12.1983 -.25 2.3271 -14.3577 -.25 2.8144
  [4,15,-14.7,-.25,1.75,-12.3,-.25,2.05,-12.1983,-.25,2.3271,-14.3577,-.25,2.8144],
// 4 15 -14.3577 -.25 .6856 -12.1983 -.25 1.7729 -12.3 -.25 2.05 -14.7 -.25 1.75
  [4,15,-14.3577,-.25,.6856,-12.1983,-.25,1.7729,-12.3,-.25,2.05,-14.7,-.25,1.75],
// 4 15 -13.54 -.25 -.0769 -11.97 -.25 1.5857 -12.1983 -.25 1.7729 -14.3577 -.25 .6856
  [4,15,-13.54,-.25,-.0769,-11.97,-.25,1.5857,-12.1983,-.25,1.7729,-14.3577,-.25,.6856],
// 4 15 -11.97 -.25 1.5857 -13.54 -.25 -.0769 -12.5093 -.25 -.5103 -11.6934 -.25 1.4828
  [4,15,-11.97,-.25,1.5857,-13.54,-.25,-.0769,-12.5093,-.25,-.5103,-11.6934,-.25,1.4828],
// 4 15 -10.9611 -.25 -.9001 -10.1153 -.25 1.0908 -11.6934 -.25 1.4828 -12.5093 -.25 -.5103
  [4,15,-10.9611,-.25,-.9001,-10.1153,-.25,1.0908,-11.6934,-.25,1.4828,-12.5093,-.25,-.5103],
// 4 15 -10.1153 -.25 1.0908 -10.9611 -.25 -.9001 -10.6009 -.25 -1.0551 -8.972 -.25 .5983
  [4,15,-10.1153,-.25,1.0908,-10.9611,-.25,-.9001,-10.6009,-.25,-1.0551,-8.972,-.25,.5983],
// 4 15 -10.3174 -.25 -1.3259 -8.0723 -.25 -.2621 -8.972 -.25 .5983 -10.6009 -.25 -1.0551
  [4,15,-10.3174,-.25,-1.3259,-8.0723,-.25,-.2621,-8.972,-.25,.5983,-10.6009,-.25,-1.0551],
// 4 15 -8.0723 -.25 -.2621 -10.3174 -.25 -1.3259 -10.2 -.25 -1.7 -7.7 -.25 -1.45
  [4,15,-8.0723,-.25,-.2621,-10.3174,-.25,-1.3259,-10.2,-.25,-1.7,-7.7,-.25,-1.45],
// 4 15 -10.3174 -.25 -2.0741 -8.0723 -.25 -2.6379 -7.7 -.25 -1.45 -10.2 -.25 -1.7
  [4,15,-10.3174,-.25,-2.0741,-8.0723,-.25,-2.6379,-7.7,-.25,-1.45,-10.2,-.25,-1.7],
// 4 15 -11.1066 -.25 2.6172 -10.2907 -.25 4.0103 -11.4 -.25 4.15 -11.4 -.25 2.65
  [4,15,-11.1066,-.25,2.6172,-10.2907,-.25,4.0103,-11.4,-.25,4.15,-11.4,-.25,2.65],
// 4 15 -12.5093 -.25 4.0103 -11.6934 -.25 2.6172 -11.4 -.25 2.65 -11.4 -.25 4.15
  [4,15,-12.5093,-.25,4.0103,-11.6934,-.25,2.6172,-11.4,-.25,2.65,-11.4,-.25,4.15],
// 4 15 -8.0723 -.25 -2.6379 -10.3174 -.25 -2.0741 -10.6009 -.25 -2.3449 -8.972 -.25 -3.4983
  [4,15,-8.0723,-.25,-2.6379,-10.3174,-.25,-2.0741,-10.6009,-.25,-2.3449,-8.972,-.25,-3.4983],
// 4 15 -8.972 -.25 -3.4983 -10.6009 -.25 -2.3449 -10.9611 -.25 -2.4999 -10.1153 -.25 -3.9908
  [4,15,-8.972,-.25,-3.4983,-10.6009,-.25,-2.3449,-10.9611,-.25,-2.4999,-10.1153,-.25,-3.9908],
// 4 15 -11.35 -.25 -2.55 -11.35 -.25 -4.15 -10.1153 -.25 -3.9908 -10.9611 -.25 -2.4999
  [4,15,-11.35,-.25,-2.55,-11.35,-.25,-4.15,-10.1153,-.25,-3.9908,-10.9611,-.25,-2.4999],
// 4 15 -11.35 -.25 -4.15 -11.35 -.25 -2.55 -11.7389 -.25 -2.4999 -12.5847 -.25 -3.9908
  [4,15,-11.35,-.25,-4.15,-11.35,-.25,-2.55,-11.7389,-.25,-2.4999,-12.5847,-.25,-3.9908],
// 4 15 -12.0991 -.25 -2.3449 -13.728 -.25 -3.4983 -12.5847 -.25 -3.9908 -11.7389 -.25 -2.4999
  [4,15,-12.0991,-.25,-2.3449,-13.728,-.25,-3.4983,-12.5847,-.25,-3.9908,-11.7389,-.25,-2.4999],
// 0 // Letter "T"
// 3 15 -7.8 -.25 4 -7.8 -.25 1.9 -5.35 -.25 1.9
  [3,15,-7.8,-.25,4,-7.8,-.25,1.9,-5.35,-.25,1.9],
// 4 15 -2.85 -.25 1.9 -.4 -.25 4 -7.8 -.25 4 -5.35 -.25 1.9
  [4,15,-2.85,-.25,1.9,-.4,-.25,4,-7.8,-.25,4,-5.35,-.25,1.9],
// 3 15 -.4 -.25 1.9 -.4 -.25 4 -2.85 -.25 1.9
  [3,15,-.4,-.25,1.9,-.4,-.25,4,-2.85,-.25,1.9],
// 4 15 -2.85 -.25 1.9 -5.35 -.25 1.9 -5.35 -.25 -4 -2.85 -.25 -4
  [4,15,-2.85,-.25,1.9,-5.35,-.25,1.9,-5.35,-.25,-4,-2.85,-.25,-4],
// 0 // Letter "O"
// 4 15 4.0349 -.25 2.2938 4.3441 -.25 4.086 3.5 -.25 4.15 3.5 -.25 2.4
  [4,15,4.0349,-.25,2.2938,4.3441,-.25,4.086,3.5,-.25,4.15,3.5,-.25,2.4],
// 4 15 4.4886 -.25 1.9913 5.169 -.25 3.8955 4.3441 -.25 4.086 4.0349 -.25 2.2938
  [4,15,4.4886,-.25,1.9913,5.169,-.25,3.8955,4.3441,-.25,4.086,4.0349,-.25,2.2938],
// 4 15 5.169 -.25 3.8955 4.4886 -.25 1.9913 4.7923 -.25 1.5385 6.0459 -.25 3.4533
  [4,15,5.169,-.25,3.8955,4.4886,-.25,1.9913,4.7923,-.25,1.5385,6.0459,-.25,3.4533],
// 4 15 6.0459 -.25 3.4533 4.7923 -.25 1.5385 4.9623 -.25 1.0407 6.733 -.25 2.7516
  [4,15,6.0459,-.25,3.4533,4.7923,-.25,1.5385,4.9623,-.25,1.0407,6.733,-.25,2.7516],
// 4 15 5.0654 -.25 -.5249 4.9623 -.25 -1.0407 6.733 -.25 -2.7516 7.3781 -.25 -1.4425
  [4,15,5.0654,-.25,-.5249,4.9623,-.25,-1.0407,6.733,-.25,-2.7516,7.3781,-.25,-1.4425],
// 4 15 6.0459 -.25 -3.4533 6.733 -.25 -2.7516 4.9623 -.25 -1.0407 4.7923 -.25 -1.5385
  [4,15,6.0459,-.25,-3.4533,6.733,-.25,-2.7516,4.9623,-.25,-1.0407,4.7923,-.25,-1.5385],
// 4 15 5.169 -.25 -3.8955 6.0459 -.25 -3.4533 4.7923 -.25 -1.5385 4.4886 -.25 -1.9913
  [4,15,5.169,-.25,-3.8955,6.0459,-.25,-3.4533,4.7923,-.25,-1.5385,4.4886,-.25,-1.9913],
// 4 15 4.3441 -.25 -4.086 5.169 -.25 -3.8955 4.4886 -.25 -1.9913 4.0349 -.25 -2.2938
  [4,15,4.3441,-.25,-4.086,5.169,-.25,-3.8955,4.4886,-.25,-1.9913,4.0349,-.25,-2.2938],
// 4 15 6.733 -.25 2.7516 4.9623 -.25 1.0407 5.0654 -.25 .5249 7.3781 -.25 1.4425
  [4,15,6.733,-.25,2.7516,4.9623,-.25,1.0407,5.0654,-.25,.5249,7.3781,-.25,1.4425],
// 4 15 7.3781 -.25 1.4425 5.0654 -.25 .5249 5.1 -.25 0 7.6 -.25 0
  [4,15,7.3781,-.25,1.4425,5.0654,-.25,.5249,5.1,-.25,0,7.6,-.25,0],
// 4 15 5.0654 -.25 -.5249 7.3781 -.25 -1.4425 7.6 -.25 0 5.1 -.25 0
  [4,15,5.0654,-.25,-.5249,7.3781,-.25,-1.4425,7.6,-.25,0,5.1,-.25,0],
// 4 15 3.5 -.25 -2.4 3.5 -.25 -4.15 4.3441 -.25 -4.086 4.0349 -.25 -2.2938
  [4,15,3.5,-.25,-2.4,3.5,-.25,-4.15,4.3441,-.25,-4.086,4.0349,-.25,-2.2938],
// 4 15 3.5 -.25 -4.15 3.5 -.25 -2.4 2.9651 -.25 -2.2938 2.6559 -.25 -4.086
  [4,15,3.5,-.25,-4.15,3.5,-.25,-2.4,2.9651,-.25,-2.2938,2.6559,-.25,-4.086],
// 4 15 2.6559 -.25 -4.086 2.9651 -.25 -2.2938 2.5114 -.25 -1.9913 1.831 -.25 -3.8955
  [4,15,2.6559,-.25,-4.086,2.9651,-.25,-2.2938,2.5114,-.25,-1.9913,1.831,-.25,-3.8955],
// 4 15 2.2077 -.25 -1.5385 .9541 -.25 -3.4533 1.831 -.25 -3.8955 2.5114 -.25 -1.9913
  [4,15,2.2077,-.25,-1.5385,.9541,-.25,-3.4533,1.831,-.25,-3.8955,2.5114,-.25,-1.9913],
// 4 15 2.0377 -.25 -1.0407 .267 -.25 -2.7516 .9541 -.25 -3.4533 2.2077 -.25 -1.5385
  [4,15,2.0377,-.25,-1.0407,.267,-.25,-2.7516,.9541,-.25,-3.4533,2.2077,-.25,-1.5385],
// 4 15 1.9346 -.25 -.5249 -.3781 -.25 -1.4425 .267 -.25 -2.7516 2.0377 -.25 -1.0407
  [4,15,1.9346,-.25,-.5249,-.3781,-.25,-1.4425,.267,-.25,-2.7516,2.0377,-.25,-1.0407],
// 4 15 1.9 -.25 0 -.6 -.25 0 -.3781 -.25 -1.4425 1.9346 -.25 -.5249
  [4,15,1.9,-.25,0,-.6,-.25,0,-.3781,-.25,-1.4425,1.9346,-.25,-.5249],
// 4 15 3.5 -.25 2.4 3.5 -.25 4.15 2.6559 -.25 4.086 2.9651 -.25 2.2938
  [4,15,3.5,-.25,2.4,3.5,-.25,4.15,2.6559,-.25,4.086,2.9651,-.25,2.2938],
// 4 15 2.2077 -.25 1.5385 2.5114 -.25 1.9913 1.831 -.25 3.8955 .9541 -.25 3.4533
  [4,15,2.2077,-.25,1.5385,2.5114,-.25,1.9913,1.831,-.25,3.8955,.9541,-.25,3.4533],
// 4 15 2.6559 -.25 4.086 1.831 -.25 3.8955 2.5114 -.25 1.9913 2.9651 -.25 2.2938
  [4,15,2.6559,-.25,4.086,1.831,-.25,3.8955,2.5114,-.25,1.9913,2.9651,-.25,2.2938],
// 4 15 .9541 -.25 3.4533 .267 -.25 2.7516 2.0377 -.25 1.0407 2.2077 -.25 1.5385
  [4,15,.9541,-.25,3.4533,.267,-.25,2.7516,2.0377,-.25,1.0407,2.2077,-.25,1.5385],
// 4 15 .267 -.25 2.7516 -.3781 -.25 1.4425 1.9346 -.25 .5249 2.0377 -.25 1.0407
  [4,15,.267,-.25,2.7516,-.3781,-.25,1.4425,1.9346,-.25,.5249,2.0377,-.25,1.0407],
// 4 15 -.6 -.25 0 1.9 -.25 0 1.9346 -.25 .5249 -.3781 -.25 1.4425
  [4,15,-.6,-.25,0,1.9,-.25,0,1.9346,-.25,.5249,-.3781,-.25,1.4425],
// 0 // Letter "P"
// 3 15 8.1 -.25 -4 10.6 -.25 -4 10.6 -.25 -1
  [3,15,8.1,-.25,-4,10.6,-.25,-4,10.6,-.25,-1],
// 4 15 10.6 -.25 -1 10.6 -.25 .6 8.1 -.25 4 8.1 -.25 -4
  [4,15,10.6,-.25,-1,10.6,-.25,.6,8.1,-.25,4,8.1,-.25,-4],
// 4 15 12.5 -.25 -1 11.6 -.25 .6 10.6 -.25 .6 10.6 -.25 -1
  [4,15,12.5,-.25,-1,11.6,-.25,.6,10.6,-.25,.6,10.6,-.25,-1],
// 4 15 8.1 -.25 4 10.6 -.25 2.4 11.6 -.25 2.4 12.5 -.25 4
  [4,15,8.1,-.25,4,10.6,-.25,2.4,11.6,-.25,2.4,12.5,-.25,4],
// 3 15 10.6 -.25 2.4 8.1 -.25 4 10.6 -.25 .6
  [3,15,10.6,-.25,2.4,8.1,-.25,4,10.6,-.25,.6],
// 3 15 12.5 -.25 4 11.6 -.25 2.4 12.5 -.25 2.4
  [3,15,12.5,-.25,4,11.6,-.25,2.4,12.5,-.25,2.4],
// 3 15 12.5 -.25 4 12.5 -.25 2.4 15 -.25 1.5
  [3,15,12.5,-.25,4,12.5,-.25,2.4,15,-.25,1.5],
// 3 15 15 -.25 1.5 12.5 -.25 2.4 12.5 -.25 1.5
  [3,15,15,-.25,1.5,12.5,-.25,2.4,12.5,-.25,1.5],
// 3 15 15 -.25 1.5 12.5 -.25 1.5 12.5 -.25 .6
  [3,15,15,-.25,1.5,12.5,-.25,1.5,12.5,-.25,.6],
// 3 15 15 -.25 1.5 12.5 -.25 .6 12.5 -.25 -1
  [3,15,15,-.25,1.5,12.5,-.25,.6,12.5,-.25,-1],
// 3 15 12.5 -.25 -1 12.5 -.25 .6 11.6 -.25 .6
  [3,15,12.5,-.25,-1,12.5,-.25,.6,11.6,-.25,.6],
];
module ldraw_lib__6177973l(step=0, col=false, unit=2/5, alt=false, line=0.2, solid=!$preview)
    makepoly(ldraw_lib__6177973l(), step=step, col=col, unit=unit, alt=alt, line=line, solid=solid);
ldraw_lib__6177973l(line=0.2);
